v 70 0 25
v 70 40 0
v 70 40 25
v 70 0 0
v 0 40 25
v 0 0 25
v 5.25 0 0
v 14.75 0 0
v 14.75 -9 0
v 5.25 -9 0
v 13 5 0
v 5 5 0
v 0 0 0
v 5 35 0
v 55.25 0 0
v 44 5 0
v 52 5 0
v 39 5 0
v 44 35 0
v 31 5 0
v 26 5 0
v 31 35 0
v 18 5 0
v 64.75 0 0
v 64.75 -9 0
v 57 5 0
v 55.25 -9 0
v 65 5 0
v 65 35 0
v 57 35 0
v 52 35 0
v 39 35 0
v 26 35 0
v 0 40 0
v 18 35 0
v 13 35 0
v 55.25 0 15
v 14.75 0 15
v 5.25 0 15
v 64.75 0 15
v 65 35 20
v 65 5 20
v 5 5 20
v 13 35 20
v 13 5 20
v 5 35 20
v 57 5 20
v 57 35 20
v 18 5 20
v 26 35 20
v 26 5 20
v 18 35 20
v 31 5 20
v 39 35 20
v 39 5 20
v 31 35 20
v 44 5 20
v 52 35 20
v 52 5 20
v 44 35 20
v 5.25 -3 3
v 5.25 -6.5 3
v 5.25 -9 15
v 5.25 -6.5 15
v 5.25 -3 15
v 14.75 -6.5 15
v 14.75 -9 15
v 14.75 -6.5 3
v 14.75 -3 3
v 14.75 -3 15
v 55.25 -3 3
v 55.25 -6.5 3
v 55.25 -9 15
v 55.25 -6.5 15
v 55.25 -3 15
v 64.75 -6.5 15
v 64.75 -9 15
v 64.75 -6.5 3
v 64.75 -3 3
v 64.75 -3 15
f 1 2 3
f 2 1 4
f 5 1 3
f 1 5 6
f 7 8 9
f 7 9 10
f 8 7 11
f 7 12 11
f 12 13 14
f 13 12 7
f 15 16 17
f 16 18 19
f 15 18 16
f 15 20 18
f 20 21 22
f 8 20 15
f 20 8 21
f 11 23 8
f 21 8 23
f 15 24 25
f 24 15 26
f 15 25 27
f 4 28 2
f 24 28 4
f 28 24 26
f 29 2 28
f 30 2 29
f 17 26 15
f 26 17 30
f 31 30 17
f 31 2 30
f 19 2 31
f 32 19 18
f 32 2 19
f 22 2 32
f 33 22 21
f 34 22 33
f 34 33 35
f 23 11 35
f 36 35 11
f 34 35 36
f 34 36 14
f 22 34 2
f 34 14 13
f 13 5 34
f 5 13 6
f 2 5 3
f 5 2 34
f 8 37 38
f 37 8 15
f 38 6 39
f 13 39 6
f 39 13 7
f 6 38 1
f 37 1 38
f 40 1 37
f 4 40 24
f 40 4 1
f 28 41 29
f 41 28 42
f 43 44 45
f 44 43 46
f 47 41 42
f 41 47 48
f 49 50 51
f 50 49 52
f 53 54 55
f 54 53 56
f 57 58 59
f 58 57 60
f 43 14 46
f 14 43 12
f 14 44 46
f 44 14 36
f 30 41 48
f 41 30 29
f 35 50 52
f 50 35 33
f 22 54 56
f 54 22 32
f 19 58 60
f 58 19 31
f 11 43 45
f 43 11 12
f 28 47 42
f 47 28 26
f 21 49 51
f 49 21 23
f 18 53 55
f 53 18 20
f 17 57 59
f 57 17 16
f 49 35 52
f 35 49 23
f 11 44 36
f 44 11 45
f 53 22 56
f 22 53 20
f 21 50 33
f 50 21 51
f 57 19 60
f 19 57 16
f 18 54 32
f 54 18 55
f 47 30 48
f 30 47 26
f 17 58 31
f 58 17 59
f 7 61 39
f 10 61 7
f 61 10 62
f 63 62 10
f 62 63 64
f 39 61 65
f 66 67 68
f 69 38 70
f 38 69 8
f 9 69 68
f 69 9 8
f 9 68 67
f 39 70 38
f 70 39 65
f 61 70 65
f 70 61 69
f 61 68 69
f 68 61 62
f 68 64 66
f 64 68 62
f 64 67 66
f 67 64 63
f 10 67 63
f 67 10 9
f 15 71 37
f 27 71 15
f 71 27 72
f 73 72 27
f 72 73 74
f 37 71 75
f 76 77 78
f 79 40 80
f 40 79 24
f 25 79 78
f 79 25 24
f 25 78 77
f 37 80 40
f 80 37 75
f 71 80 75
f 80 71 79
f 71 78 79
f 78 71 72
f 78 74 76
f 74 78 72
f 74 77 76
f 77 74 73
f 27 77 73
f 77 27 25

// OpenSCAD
// file: ../assets/hanger.scad
/** \module hanger_solid
 * This module create 3D solid for hanger to mount it on performated wall,
 * it can be glued to objects that would be placed on that wall.
 * @param width Width of the hanger, it must be less or equal to hole width
 * @param height Height of the hanger, it must be less to hole height 
 * @param thickness Thickness of the wall
 */
module hanger_solid(width, height, thickness) {
    linear_extrude(width - 0.5) {
        hanger_polygon(height, thickness);
    }
}

/** \module hanger_polygon
 * This module create 2D polygon for hanger, to use in models, that is 2D to
 * glued it before extrude.
 * @param height Height of the hanger, it must be less to hole height 
 * @param thickness Thickness of the wall
 */
module hanger_polygon(height, thickness) {
    polygon([
        [0, height],
        [0, 0],
        [thickness * 3, 0],
        [thickness * 3, height],
        [thickness * 2, height],
        [thickness * 2, thickness],
        [thickness - 0.5, thickness],
        [thickness - 0.5, height],
    ]);
}

/** \module hanging_for_modules
 * This draw hanging part of the modules, like containers. It draw hangers on
 * all width of the module.
 * @param width Width of the module
 * @param hole_width Width of the hole in perforated wall
 * @param hole_height Height of the hole in perforated wall
 * @param holes_spacing Space between the holes
 * @param wall_thickness Thickness of the wall
 */
module hanging_for_modules(
    width, 
    hole_width, 
    hole_height, 
    holes_spacing, 
    wall_thickness
) {
    width_contain_holes = width - (hole_width - 0.5);
    start_position = width_contain_holes % holes_spacing / 2;

    for (count = [start_position: holes_spacing : width_contain_holes]) {
        rotate([90, 0, 90]) translate([0 - wall_thickness * 3, 0, count]) {
            hanger_solid(hole_width, hole_height, wall_thickness);
        }
    }
}

/** \module hanger_hole
 * This module draw hole for mount the hanger on wall. It require width and
 * height, and it must be same as in hanger, because when it is not the same, 
 * hanger would not suite to the hole.
 * @param width Width of the hole
 * @param height Height of the hole
 */
module hanger_hole(width, height) {
    square([width, height]);
}
// file: ../assets/dividers.scad
include <../assets/container.scad>

/** \module partitions
 * This module draw partition which split container or other space into two 
 * parts.
 * @param height Height of the partition
 * @param depth Depth of the partition
 * @param thickness Thickness of the partition
 */
module partitions(height, depth, thickness) {
    cube([thickness, height, depth]);
}

/** \module dividers
 * This draw dividers to split space in the container into specified count of
 * parts.
 * @param width Width of the space
 * @param height Height of the space
 * @param depth Depth of the space
 * @param thickness Thickness of the partitions
 * @param divider_count Into how many parts split space
 */
module dividers(width, height, depth, thickness, divider_count) {
    divider_width = width / divider_count;
    divider_start = divider_width - thickness / 2;

    for (count = [divider_start : divider_width : width - divider_width]) {
        translate([count, 0, 0]) {
            partitions(height, depth, thickness);
        }
    }
}

/** \module compartment_container
 * This draw container witch dividers which can be used as organiser, it not 
 * use a lot of space, like a lot of small containers, but it has a specified 
 * count of compartment to use it like such boxes.
 * @param width Width of the container
 * @param height Height of the container
 * @param depth Depth of the container
 * @param thickness Thickness of the container walls
 * @param divider_count Count of dividers in the container
 */
module compartment_container(width, height, depth, thickness, divider_count) {
    container(width, height, depth, thickness);
    
    full_width = width + thickness;
    full_height = height + thickness * 2;

    translate([thickness / 2, 0, 0]) {
        dividers(full_width, full_height, depth, thickness, divider_count);
    }
}

/** \module hanging_compartment_container
 * This draw hanging containeri with dividers, like combination of 
 * hanging_container and compartment_container. 
 * @param container_width Width of the container
 * @param container_height Height of the container 
 * @param container_depth Depth of the container
 * @param container_wall_thickness Thickness of the walls in the container
 * @param hole_width Width of the hole in performated wall
 * @param hole_height Height of the hole in performated wall
 * @param holes_spacing Space between holes
 * @param wall_thickness Thickness of the perforated wall
 * @param divider_count How many dividers contain container
 */
module hanging_compartment_container(
    container_width, 
    container_height, 
    container_depth, 
    container_wall_thickness,
    hole_width,
    hole_height,
    holes_spacing,
    wall_thickness, 
    divider_count,
) {
    compartment_container(
        container_width, 
        container_height, 
        container_depth,
        container_wall_thickness,
        divider_count
    );

    container_full_width = container_width + container_wall_thickness * 2;

    hanging_for_modules(
        container_full_width,
        hole_width,
        hole_height,
        holes_spacing,
        wall_thickness
    );
}
// file: ../assets/container.scad
include <hanger.scad>

/** \module container
 * This draw 3D container with definied walls thickness, inside width, height
 * and depth. You must know that general width, height and depth is larger by
 * walls thickness.
 * @param width Width of the box inside it (X)
 * @param height Height of the box inside it (Z)
 * @param depth Depth of the box inside it (Y)
 * @param thickness Thickness of the walls
 */
module container(width, height, depth, thickness) {
    difference() {
        cube([
            width + thickness * 2, 
            height + thickness * 2, 
            depth + thickness
        ]);
        
        translate([thickness, thickness]) {
            cube([width, height, depth]);
        }
    }
}

/** \module hanging_container 
 * This module draw solid hanging container, that mean container with hanging 
 * module to place it on performed wall. 
 * @param container_width Width of container inside
 * @param container_height Height of container inside
 * @param container_depth Depth of container inside
 * @param container_wall_thickness Thickness of container walls
 * @param hole_width Width of hole in wall
 * @param hole_height Height of hole in wall
 * @param holes_spacing Space between holes in wall
 * @param wall_thickness Thickness of wall to place container on it
 */
module hanging_container(
    container_width, 
    container_height, 
    container_depth, 
    container_wall_thickness,
    hole_width,
    hole_height,
    holes_spacing,
    wall_thickness, 
) {
    container(
        container_width, 
        container_height, 
        container_depth, 
        container_wall_thickness
    );
    

    container_outside_width = container_width + container_wall_thickness * 2;
    
    hanging_for_modules(
        container_outside_width,
        hole_width,
        hole_height,
        holes_spacing,
        wall_thickness
    );
}
// main file
include <../assets/container.scad>
include <../assets/dividers.scad>

/* Variables from command line */
width = 60;
height = 30;
depth = 20;
thickness = 3;
container_wall_thickness = 5;
hole_width = 10;
hole_height = 15;
holes_spacing = 50;
wall_thickness = 3;
dividers = 5;

/* Draw container */
hanging_compartment_container(
    width, 
    height, 
    depth, 
    container_wall_thickness, 
    hole_width, 
    hole_height, 
    holes_spacing, 
    wall_thickness,
    dividers
);
